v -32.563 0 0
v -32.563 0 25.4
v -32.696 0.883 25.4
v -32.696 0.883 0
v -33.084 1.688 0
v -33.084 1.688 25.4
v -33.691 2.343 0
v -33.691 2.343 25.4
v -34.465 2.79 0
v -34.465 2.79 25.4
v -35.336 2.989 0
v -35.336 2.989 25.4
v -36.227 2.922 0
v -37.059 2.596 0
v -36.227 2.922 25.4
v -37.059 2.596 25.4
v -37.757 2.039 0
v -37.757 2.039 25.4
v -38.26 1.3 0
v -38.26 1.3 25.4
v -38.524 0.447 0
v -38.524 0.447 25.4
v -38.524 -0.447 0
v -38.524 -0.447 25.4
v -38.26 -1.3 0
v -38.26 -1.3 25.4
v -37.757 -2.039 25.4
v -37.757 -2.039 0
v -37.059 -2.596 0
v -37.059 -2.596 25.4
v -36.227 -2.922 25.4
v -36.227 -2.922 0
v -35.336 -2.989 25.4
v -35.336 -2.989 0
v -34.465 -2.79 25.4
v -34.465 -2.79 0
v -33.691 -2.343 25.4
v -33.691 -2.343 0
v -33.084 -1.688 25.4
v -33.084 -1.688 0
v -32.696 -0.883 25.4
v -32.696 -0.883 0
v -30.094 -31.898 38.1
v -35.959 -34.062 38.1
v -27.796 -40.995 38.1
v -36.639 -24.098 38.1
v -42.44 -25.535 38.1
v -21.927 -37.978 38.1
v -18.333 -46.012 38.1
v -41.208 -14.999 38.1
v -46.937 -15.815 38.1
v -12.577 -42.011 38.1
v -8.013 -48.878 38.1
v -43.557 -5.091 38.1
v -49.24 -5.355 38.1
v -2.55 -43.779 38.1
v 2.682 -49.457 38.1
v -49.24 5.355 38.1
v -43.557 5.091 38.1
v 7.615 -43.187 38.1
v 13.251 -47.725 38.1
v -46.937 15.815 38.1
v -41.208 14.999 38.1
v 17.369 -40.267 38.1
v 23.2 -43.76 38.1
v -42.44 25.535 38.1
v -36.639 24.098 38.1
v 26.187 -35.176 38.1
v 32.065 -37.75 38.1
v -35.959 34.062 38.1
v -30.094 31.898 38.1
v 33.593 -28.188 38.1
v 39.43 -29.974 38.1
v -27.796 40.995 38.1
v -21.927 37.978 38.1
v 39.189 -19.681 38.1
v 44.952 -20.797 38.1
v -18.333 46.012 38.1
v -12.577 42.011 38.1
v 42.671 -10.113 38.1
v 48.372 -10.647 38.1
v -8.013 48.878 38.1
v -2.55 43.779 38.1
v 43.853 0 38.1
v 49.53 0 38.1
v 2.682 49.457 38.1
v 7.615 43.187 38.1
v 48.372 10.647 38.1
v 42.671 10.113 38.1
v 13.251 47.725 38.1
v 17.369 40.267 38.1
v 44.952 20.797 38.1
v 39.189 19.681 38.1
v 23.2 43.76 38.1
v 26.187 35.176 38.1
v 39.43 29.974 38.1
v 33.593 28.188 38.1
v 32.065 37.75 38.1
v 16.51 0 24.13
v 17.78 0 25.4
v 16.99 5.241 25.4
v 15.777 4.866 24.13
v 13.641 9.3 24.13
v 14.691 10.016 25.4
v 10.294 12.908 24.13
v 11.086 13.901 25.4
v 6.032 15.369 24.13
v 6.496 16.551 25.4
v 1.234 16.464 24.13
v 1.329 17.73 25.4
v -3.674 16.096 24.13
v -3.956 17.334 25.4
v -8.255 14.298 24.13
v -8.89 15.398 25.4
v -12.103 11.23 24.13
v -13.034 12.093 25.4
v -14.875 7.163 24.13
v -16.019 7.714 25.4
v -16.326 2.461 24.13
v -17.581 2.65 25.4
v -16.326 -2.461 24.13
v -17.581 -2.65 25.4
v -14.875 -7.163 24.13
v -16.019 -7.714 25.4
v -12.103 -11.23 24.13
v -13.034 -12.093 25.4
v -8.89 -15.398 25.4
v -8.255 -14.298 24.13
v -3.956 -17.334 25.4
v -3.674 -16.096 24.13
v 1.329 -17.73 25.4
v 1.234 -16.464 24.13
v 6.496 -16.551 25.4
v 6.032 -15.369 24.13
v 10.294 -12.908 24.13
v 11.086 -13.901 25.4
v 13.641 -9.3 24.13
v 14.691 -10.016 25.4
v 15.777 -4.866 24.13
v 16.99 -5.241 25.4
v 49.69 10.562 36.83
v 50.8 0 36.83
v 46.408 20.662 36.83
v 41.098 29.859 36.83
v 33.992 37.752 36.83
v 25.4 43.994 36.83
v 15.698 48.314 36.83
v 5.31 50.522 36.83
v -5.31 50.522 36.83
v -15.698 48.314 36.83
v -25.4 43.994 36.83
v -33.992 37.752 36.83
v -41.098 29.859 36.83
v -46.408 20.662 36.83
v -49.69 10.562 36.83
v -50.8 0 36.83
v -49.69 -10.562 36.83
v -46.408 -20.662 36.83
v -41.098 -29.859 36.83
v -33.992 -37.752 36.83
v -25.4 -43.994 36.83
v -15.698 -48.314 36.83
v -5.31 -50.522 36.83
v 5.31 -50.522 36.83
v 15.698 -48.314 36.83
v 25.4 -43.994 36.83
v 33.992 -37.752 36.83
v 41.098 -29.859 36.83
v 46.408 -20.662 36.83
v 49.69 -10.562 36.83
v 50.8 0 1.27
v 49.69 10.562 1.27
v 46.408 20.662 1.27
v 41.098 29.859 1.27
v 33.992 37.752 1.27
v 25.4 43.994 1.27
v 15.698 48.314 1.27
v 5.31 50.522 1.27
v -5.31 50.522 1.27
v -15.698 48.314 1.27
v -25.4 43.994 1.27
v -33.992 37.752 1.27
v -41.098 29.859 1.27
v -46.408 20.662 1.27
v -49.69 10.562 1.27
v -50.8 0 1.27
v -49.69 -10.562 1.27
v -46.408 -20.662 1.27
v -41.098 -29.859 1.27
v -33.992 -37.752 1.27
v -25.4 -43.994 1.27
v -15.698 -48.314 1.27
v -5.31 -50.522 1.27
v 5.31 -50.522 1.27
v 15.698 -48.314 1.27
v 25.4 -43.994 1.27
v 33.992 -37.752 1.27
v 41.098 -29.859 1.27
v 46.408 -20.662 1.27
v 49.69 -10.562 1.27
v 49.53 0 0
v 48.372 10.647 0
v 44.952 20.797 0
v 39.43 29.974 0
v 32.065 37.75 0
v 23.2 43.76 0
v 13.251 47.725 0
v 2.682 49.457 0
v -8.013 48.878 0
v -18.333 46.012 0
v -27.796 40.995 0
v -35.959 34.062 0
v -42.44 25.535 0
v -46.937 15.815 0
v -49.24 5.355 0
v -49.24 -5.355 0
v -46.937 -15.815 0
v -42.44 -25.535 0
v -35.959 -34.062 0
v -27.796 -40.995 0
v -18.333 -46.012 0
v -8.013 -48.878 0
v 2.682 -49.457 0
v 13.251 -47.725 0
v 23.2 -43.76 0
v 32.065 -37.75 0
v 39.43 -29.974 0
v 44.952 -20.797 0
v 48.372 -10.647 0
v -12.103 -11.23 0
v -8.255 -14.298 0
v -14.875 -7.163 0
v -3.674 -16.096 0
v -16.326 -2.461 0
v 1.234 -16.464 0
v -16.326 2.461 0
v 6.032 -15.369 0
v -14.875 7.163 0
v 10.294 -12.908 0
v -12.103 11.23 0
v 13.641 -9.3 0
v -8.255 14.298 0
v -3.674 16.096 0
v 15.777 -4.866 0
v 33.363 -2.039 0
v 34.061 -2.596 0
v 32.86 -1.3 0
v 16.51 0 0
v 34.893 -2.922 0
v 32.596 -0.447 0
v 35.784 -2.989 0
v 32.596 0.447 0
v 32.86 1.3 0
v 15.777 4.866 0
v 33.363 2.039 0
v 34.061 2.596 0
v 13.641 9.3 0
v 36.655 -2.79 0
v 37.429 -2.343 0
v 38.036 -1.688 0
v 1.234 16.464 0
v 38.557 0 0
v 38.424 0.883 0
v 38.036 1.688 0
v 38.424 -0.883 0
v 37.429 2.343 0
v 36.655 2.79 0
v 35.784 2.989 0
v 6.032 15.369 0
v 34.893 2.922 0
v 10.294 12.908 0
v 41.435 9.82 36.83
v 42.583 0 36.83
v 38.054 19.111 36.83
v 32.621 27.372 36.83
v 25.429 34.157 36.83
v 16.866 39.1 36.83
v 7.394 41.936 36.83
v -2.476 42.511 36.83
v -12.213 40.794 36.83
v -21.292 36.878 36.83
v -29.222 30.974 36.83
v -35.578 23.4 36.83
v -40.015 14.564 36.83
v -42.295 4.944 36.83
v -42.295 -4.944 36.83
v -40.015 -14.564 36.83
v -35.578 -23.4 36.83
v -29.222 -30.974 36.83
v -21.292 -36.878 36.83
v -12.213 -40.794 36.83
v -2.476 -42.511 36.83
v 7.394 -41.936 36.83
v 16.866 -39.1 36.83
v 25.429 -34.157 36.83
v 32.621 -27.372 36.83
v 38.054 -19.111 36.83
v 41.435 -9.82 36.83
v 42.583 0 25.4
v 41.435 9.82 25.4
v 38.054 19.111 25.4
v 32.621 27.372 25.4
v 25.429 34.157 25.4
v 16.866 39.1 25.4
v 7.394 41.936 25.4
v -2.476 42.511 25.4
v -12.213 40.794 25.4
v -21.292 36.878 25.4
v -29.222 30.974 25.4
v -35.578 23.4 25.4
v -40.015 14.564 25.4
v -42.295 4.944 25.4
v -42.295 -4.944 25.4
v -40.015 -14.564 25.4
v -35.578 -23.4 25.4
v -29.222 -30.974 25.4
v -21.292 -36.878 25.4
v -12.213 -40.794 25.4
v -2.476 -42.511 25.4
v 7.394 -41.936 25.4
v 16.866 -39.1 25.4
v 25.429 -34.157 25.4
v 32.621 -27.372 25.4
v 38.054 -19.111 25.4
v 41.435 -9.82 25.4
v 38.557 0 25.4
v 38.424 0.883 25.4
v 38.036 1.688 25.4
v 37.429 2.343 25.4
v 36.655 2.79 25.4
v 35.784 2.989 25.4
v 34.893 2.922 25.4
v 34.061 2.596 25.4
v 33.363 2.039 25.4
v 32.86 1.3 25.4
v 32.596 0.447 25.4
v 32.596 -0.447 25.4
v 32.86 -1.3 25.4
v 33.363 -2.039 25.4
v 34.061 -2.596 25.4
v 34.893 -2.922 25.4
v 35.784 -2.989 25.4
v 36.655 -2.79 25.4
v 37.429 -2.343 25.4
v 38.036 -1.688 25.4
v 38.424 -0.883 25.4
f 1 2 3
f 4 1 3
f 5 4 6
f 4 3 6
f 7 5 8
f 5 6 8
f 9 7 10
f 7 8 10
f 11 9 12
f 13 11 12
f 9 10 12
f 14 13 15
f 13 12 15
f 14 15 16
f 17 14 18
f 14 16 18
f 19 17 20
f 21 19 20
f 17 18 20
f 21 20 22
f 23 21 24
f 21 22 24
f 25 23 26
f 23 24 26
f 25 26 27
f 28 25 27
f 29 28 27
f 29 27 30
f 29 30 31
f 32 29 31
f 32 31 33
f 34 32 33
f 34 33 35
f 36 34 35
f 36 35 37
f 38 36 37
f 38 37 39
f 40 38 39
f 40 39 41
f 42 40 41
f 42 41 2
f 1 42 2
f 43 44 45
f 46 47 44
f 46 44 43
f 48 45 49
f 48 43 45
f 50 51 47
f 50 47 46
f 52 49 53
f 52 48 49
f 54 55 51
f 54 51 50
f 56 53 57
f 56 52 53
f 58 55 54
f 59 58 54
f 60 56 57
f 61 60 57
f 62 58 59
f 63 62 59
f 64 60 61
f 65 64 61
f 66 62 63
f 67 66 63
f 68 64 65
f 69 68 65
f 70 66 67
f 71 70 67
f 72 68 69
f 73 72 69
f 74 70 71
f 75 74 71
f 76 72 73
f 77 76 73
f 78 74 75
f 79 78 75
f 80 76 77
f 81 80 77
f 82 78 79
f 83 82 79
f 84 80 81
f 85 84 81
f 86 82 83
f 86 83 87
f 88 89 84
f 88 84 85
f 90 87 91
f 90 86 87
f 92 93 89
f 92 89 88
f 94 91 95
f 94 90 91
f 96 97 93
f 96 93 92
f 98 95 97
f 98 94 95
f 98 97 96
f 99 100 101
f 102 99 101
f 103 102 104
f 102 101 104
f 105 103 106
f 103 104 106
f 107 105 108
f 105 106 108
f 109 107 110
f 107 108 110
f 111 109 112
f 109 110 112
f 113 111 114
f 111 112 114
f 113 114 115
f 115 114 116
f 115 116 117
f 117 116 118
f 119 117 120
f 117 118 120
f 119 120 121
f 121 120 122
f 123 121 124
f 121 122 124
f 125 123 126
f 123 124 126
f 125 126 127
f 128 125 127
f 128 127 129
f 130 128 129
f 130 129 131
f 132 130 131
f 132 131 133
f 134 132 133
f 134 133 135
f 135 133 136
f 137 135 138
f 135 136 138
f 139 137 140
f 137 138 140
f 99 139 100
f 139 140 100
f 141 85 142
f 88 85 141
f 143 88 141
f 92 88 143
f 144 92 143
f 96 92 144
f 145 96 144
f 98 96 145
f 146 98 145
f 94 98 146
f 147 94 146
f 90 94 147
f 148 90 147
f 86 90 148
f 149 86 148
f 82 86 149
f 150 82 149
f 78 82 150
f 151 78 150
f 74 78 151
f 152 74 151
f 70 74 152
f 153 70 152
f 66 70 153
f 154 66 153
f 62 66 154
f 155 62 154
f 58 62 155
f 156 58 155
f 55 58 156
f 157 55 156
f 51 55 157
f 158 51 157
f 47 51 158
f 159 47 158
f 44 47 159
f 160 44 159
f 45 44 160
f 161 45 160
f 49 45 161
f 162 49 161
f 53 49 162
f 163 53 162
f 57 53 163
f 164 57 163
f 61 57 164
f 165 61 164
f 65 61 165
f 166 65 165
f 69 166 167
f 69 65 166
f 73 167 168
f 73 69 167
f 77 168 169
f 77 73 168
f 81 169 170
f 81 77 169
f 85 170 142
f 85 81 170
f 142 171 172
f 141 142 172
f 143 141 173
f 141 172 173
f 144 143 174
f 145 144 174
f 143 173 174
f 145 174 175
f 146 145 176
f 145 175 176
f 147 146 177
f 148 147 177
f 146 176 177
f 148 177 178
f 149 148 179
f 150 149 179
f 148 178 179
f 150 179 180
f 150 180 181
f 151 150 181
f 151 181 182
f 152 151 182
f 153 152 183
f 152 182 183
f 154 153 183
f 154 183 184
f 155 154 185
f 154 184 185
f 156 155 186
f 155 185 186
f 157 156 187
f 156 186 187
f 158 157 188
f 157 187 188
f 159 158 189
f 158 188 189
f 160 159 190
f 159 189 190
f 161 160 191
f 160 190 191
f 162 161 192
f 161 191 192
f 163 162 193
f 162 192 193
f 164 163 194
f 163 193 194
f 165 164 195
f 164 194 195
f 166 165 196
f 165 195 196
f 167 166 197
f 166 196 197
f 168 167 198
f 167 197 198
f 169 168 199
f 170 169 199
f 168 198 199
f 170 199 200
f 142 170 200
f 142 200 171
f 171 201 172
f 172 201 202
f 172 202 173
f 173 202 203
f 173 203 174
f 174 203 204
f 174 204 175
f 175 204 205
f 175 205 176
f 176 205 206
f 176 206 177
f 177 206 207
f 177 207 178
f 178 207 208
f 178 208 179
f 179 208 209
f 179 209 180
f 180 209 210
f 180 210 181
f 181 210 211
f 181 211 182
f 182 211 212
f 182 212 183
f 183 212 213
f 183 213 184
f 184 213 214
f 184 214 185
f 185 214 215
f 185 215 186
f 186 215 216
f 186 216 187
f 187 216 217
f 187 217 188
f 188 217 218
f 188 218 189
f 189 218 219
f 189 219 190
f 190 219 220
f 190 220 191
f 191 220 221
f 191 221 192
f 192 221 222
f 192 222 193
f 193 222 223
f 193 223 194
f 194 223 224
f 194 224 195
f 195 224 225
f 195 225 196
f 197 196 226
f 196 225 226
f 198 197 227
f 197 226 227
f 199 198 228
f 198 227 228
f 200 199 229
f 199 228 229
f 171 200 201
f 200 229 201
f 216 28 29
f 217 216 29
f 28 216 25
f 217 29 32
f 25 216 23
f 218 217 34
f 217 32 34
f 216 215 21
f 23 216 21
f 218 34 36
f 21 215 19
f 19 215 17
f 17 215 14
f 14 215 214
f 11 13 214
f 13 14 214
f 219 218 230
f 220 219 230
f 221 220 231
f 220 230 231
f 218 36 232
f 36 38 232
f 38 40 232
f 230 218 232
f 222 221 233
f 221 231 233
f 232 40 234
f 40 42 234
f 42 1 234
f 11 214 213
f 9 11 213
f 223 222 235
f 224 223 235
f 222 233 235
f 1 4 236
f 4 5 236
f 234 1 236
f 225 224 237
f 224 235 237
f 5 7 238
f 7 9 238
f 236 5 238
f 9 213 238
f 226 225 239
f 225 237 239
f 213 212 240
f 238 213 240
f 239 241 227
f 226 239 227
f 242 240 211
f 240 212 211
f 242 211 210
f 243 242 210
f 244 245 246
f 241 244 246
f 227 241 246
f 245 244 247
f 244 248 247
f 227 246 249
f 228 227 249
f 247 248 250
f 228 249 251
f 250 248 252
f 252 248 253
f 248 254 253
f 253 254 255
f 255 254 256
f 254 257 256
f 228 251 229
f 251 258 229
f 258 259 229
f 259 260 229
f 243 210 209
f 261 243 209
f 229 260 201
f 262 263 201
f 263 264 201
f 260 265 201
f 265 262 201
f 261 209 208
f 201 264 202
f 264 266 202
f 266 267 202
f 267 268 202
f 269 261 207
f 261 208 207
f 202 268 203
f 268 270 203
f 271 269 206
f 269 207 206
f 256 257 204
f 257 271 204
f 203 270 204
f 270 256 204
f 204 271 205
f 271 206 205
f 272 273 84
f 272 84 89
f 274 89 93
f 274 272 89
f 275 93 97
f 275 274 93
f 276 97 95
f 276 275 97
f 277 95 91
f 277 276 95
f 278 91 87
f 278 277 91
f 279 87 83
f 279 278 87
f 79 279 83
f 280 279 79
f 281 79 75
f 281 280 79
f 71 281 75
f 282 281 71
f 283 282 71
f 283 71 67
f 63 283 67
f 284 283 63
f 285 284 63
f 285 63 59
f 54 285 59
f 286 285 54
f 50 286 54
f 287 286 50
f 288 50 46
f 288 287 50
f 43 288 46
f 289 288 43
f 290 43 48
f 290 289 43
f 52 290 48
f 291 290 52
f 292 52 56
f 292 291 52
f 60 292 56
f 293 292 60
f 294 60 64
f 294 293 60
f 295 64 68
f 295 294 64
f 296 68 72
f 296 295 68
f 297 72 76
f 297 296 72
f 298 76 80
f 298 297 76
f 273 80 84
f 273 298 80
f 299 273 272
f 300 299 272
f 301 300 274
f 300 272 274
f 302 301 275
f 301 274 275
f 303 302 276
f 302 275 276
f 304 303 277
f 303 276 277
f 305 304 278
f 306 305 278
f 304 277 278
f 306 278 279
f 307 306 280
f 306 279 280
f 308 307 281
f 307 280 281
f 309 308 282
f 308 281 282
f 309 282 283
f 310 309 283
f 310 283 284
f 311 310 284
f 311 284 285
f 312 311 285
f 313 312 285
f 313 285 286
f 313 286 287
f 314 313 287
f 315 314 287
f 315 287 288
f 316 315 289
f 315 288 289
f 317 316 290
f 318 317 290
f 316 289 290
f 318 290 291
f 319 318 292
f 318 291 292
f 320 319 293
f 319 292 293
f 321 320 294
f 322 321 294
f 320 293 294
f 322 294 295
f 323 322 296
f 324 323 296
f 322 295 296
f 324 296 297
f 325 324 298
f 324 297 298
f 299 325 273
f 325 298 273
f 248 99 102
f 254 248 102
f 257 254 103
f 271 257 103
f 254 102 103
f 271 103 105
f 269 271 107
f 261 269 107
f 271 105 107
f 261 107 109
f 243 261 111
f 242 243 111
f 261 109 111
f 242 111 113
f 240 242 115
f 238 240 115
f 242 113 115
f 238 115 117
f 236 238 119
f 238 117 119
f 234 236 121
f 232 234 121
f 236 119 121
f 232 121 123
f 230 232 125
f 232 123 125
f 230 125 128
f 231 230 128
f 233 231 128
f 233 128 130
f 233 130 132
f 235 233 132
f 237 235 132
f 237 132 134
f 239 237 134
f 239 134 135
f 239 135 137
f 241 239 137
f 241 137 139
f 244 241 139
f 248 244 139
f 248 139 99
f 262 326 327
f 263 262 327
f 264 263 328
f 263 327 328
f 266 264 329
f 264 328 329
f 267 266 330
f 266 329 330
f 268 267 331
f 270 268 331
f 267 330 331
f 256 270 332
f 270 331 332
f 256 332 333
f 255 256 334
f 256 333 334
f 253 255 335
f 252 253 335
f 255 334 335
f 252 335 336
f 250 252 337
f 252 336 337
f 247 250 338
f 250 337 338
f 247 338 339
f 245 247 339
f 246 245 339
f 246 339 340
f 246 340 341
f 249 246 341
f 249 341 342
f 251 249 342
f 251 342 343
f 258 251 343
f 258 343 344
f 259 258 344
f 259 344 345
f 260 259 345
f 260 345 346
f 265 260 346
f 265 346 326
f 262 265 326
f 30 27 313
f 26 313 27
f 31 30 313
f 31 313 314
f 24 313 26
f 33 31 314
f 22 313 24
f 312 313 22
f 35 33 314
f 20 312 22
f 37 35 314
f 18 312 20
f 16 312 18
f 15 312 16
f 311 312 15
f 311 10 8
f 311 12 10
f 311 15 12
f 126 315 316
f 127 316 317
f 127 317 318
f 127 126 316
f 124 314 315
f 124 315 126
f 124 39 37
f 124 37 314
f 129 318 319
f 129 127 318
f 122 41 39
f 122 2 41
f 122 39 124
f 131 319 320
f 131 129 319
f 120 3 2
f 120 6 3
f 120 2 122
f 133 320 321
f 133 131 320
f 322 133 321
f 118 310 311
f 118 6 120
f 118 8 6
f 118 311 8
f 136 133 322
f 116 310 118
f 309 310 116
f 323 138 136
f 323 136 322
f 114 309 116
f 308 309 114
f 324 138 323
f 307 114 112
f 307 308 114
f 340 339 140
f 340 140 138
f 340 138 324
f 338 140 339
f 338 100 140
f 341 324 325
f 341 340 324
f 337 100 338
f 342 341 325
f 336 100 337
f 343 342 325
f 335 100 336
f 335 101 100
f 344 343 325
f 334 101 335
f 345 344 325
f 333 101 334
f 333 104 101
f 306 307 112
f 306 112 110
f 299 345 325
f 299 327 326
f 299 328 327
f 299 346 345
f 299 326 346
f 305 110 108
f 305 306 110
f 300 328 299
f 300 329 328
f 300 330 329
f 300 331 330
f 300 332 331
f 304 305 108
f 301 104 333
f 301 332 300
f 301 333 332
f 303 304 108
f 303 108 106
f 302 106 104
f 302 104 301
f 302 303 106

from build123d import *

# Parameters (mm, degrees)
F0_R     = 50.8
F1_DEPTH = 38.1
F2_R     = 42.5831
F3_DEPTH = 12.7
F4_R     = 16.51
F5_DEPTH = 25.401
F6_SIZE  = 1.27
F7_R     = 2.9972
F8_DEPTH = 25.401


with BuildPart() as f1:
    # F0 (on Top) → F1 (new body)
    with BuildSketch(Plane.XY):
        Circle(F0_R)
    extrude(amount=F1_DEPTH)

    # F2 (on face) → F3 (cut)
    with BuildSketch(Plane.XY.offset(38.1)):
        Circle(F2_R)
    extrude(amount=-F3_DEPTH, mode=Mode.SUBTRACT)

    # F4 (on face) → F5 (cut, through all)
    with BuildSketch(Plane.XY.offset(25.4)):
        Circle(F4_R)
    extrude(amount=-F5_DEPTH, mode=Mode.SUBTRACT)

    # F6
    f6_edges = [f1.edges().sort_by_distance(p)[0] for p in [
        (-42.5831, 0, 38.1),
        (-16.51, 0, 25.4),
        (-50.8, 0, 38.1),
        (-50.8, 0, 0),
    ]]
    chamfer(f6_edges, length=F6_SIZE)

    # F7 (on face) → F8 (cut, through all)
    with BuildSketch(Plane.XY.offset(25.4)):
        with Locations((35.56, 0)):
            Circle(F7_R)
        with Locations((-35.56, 0)):
            Circle(F7_R)
    extrude(amount=-F8_DEPTH, mode=Mode.SUBTRACT)


solid = f1.part
